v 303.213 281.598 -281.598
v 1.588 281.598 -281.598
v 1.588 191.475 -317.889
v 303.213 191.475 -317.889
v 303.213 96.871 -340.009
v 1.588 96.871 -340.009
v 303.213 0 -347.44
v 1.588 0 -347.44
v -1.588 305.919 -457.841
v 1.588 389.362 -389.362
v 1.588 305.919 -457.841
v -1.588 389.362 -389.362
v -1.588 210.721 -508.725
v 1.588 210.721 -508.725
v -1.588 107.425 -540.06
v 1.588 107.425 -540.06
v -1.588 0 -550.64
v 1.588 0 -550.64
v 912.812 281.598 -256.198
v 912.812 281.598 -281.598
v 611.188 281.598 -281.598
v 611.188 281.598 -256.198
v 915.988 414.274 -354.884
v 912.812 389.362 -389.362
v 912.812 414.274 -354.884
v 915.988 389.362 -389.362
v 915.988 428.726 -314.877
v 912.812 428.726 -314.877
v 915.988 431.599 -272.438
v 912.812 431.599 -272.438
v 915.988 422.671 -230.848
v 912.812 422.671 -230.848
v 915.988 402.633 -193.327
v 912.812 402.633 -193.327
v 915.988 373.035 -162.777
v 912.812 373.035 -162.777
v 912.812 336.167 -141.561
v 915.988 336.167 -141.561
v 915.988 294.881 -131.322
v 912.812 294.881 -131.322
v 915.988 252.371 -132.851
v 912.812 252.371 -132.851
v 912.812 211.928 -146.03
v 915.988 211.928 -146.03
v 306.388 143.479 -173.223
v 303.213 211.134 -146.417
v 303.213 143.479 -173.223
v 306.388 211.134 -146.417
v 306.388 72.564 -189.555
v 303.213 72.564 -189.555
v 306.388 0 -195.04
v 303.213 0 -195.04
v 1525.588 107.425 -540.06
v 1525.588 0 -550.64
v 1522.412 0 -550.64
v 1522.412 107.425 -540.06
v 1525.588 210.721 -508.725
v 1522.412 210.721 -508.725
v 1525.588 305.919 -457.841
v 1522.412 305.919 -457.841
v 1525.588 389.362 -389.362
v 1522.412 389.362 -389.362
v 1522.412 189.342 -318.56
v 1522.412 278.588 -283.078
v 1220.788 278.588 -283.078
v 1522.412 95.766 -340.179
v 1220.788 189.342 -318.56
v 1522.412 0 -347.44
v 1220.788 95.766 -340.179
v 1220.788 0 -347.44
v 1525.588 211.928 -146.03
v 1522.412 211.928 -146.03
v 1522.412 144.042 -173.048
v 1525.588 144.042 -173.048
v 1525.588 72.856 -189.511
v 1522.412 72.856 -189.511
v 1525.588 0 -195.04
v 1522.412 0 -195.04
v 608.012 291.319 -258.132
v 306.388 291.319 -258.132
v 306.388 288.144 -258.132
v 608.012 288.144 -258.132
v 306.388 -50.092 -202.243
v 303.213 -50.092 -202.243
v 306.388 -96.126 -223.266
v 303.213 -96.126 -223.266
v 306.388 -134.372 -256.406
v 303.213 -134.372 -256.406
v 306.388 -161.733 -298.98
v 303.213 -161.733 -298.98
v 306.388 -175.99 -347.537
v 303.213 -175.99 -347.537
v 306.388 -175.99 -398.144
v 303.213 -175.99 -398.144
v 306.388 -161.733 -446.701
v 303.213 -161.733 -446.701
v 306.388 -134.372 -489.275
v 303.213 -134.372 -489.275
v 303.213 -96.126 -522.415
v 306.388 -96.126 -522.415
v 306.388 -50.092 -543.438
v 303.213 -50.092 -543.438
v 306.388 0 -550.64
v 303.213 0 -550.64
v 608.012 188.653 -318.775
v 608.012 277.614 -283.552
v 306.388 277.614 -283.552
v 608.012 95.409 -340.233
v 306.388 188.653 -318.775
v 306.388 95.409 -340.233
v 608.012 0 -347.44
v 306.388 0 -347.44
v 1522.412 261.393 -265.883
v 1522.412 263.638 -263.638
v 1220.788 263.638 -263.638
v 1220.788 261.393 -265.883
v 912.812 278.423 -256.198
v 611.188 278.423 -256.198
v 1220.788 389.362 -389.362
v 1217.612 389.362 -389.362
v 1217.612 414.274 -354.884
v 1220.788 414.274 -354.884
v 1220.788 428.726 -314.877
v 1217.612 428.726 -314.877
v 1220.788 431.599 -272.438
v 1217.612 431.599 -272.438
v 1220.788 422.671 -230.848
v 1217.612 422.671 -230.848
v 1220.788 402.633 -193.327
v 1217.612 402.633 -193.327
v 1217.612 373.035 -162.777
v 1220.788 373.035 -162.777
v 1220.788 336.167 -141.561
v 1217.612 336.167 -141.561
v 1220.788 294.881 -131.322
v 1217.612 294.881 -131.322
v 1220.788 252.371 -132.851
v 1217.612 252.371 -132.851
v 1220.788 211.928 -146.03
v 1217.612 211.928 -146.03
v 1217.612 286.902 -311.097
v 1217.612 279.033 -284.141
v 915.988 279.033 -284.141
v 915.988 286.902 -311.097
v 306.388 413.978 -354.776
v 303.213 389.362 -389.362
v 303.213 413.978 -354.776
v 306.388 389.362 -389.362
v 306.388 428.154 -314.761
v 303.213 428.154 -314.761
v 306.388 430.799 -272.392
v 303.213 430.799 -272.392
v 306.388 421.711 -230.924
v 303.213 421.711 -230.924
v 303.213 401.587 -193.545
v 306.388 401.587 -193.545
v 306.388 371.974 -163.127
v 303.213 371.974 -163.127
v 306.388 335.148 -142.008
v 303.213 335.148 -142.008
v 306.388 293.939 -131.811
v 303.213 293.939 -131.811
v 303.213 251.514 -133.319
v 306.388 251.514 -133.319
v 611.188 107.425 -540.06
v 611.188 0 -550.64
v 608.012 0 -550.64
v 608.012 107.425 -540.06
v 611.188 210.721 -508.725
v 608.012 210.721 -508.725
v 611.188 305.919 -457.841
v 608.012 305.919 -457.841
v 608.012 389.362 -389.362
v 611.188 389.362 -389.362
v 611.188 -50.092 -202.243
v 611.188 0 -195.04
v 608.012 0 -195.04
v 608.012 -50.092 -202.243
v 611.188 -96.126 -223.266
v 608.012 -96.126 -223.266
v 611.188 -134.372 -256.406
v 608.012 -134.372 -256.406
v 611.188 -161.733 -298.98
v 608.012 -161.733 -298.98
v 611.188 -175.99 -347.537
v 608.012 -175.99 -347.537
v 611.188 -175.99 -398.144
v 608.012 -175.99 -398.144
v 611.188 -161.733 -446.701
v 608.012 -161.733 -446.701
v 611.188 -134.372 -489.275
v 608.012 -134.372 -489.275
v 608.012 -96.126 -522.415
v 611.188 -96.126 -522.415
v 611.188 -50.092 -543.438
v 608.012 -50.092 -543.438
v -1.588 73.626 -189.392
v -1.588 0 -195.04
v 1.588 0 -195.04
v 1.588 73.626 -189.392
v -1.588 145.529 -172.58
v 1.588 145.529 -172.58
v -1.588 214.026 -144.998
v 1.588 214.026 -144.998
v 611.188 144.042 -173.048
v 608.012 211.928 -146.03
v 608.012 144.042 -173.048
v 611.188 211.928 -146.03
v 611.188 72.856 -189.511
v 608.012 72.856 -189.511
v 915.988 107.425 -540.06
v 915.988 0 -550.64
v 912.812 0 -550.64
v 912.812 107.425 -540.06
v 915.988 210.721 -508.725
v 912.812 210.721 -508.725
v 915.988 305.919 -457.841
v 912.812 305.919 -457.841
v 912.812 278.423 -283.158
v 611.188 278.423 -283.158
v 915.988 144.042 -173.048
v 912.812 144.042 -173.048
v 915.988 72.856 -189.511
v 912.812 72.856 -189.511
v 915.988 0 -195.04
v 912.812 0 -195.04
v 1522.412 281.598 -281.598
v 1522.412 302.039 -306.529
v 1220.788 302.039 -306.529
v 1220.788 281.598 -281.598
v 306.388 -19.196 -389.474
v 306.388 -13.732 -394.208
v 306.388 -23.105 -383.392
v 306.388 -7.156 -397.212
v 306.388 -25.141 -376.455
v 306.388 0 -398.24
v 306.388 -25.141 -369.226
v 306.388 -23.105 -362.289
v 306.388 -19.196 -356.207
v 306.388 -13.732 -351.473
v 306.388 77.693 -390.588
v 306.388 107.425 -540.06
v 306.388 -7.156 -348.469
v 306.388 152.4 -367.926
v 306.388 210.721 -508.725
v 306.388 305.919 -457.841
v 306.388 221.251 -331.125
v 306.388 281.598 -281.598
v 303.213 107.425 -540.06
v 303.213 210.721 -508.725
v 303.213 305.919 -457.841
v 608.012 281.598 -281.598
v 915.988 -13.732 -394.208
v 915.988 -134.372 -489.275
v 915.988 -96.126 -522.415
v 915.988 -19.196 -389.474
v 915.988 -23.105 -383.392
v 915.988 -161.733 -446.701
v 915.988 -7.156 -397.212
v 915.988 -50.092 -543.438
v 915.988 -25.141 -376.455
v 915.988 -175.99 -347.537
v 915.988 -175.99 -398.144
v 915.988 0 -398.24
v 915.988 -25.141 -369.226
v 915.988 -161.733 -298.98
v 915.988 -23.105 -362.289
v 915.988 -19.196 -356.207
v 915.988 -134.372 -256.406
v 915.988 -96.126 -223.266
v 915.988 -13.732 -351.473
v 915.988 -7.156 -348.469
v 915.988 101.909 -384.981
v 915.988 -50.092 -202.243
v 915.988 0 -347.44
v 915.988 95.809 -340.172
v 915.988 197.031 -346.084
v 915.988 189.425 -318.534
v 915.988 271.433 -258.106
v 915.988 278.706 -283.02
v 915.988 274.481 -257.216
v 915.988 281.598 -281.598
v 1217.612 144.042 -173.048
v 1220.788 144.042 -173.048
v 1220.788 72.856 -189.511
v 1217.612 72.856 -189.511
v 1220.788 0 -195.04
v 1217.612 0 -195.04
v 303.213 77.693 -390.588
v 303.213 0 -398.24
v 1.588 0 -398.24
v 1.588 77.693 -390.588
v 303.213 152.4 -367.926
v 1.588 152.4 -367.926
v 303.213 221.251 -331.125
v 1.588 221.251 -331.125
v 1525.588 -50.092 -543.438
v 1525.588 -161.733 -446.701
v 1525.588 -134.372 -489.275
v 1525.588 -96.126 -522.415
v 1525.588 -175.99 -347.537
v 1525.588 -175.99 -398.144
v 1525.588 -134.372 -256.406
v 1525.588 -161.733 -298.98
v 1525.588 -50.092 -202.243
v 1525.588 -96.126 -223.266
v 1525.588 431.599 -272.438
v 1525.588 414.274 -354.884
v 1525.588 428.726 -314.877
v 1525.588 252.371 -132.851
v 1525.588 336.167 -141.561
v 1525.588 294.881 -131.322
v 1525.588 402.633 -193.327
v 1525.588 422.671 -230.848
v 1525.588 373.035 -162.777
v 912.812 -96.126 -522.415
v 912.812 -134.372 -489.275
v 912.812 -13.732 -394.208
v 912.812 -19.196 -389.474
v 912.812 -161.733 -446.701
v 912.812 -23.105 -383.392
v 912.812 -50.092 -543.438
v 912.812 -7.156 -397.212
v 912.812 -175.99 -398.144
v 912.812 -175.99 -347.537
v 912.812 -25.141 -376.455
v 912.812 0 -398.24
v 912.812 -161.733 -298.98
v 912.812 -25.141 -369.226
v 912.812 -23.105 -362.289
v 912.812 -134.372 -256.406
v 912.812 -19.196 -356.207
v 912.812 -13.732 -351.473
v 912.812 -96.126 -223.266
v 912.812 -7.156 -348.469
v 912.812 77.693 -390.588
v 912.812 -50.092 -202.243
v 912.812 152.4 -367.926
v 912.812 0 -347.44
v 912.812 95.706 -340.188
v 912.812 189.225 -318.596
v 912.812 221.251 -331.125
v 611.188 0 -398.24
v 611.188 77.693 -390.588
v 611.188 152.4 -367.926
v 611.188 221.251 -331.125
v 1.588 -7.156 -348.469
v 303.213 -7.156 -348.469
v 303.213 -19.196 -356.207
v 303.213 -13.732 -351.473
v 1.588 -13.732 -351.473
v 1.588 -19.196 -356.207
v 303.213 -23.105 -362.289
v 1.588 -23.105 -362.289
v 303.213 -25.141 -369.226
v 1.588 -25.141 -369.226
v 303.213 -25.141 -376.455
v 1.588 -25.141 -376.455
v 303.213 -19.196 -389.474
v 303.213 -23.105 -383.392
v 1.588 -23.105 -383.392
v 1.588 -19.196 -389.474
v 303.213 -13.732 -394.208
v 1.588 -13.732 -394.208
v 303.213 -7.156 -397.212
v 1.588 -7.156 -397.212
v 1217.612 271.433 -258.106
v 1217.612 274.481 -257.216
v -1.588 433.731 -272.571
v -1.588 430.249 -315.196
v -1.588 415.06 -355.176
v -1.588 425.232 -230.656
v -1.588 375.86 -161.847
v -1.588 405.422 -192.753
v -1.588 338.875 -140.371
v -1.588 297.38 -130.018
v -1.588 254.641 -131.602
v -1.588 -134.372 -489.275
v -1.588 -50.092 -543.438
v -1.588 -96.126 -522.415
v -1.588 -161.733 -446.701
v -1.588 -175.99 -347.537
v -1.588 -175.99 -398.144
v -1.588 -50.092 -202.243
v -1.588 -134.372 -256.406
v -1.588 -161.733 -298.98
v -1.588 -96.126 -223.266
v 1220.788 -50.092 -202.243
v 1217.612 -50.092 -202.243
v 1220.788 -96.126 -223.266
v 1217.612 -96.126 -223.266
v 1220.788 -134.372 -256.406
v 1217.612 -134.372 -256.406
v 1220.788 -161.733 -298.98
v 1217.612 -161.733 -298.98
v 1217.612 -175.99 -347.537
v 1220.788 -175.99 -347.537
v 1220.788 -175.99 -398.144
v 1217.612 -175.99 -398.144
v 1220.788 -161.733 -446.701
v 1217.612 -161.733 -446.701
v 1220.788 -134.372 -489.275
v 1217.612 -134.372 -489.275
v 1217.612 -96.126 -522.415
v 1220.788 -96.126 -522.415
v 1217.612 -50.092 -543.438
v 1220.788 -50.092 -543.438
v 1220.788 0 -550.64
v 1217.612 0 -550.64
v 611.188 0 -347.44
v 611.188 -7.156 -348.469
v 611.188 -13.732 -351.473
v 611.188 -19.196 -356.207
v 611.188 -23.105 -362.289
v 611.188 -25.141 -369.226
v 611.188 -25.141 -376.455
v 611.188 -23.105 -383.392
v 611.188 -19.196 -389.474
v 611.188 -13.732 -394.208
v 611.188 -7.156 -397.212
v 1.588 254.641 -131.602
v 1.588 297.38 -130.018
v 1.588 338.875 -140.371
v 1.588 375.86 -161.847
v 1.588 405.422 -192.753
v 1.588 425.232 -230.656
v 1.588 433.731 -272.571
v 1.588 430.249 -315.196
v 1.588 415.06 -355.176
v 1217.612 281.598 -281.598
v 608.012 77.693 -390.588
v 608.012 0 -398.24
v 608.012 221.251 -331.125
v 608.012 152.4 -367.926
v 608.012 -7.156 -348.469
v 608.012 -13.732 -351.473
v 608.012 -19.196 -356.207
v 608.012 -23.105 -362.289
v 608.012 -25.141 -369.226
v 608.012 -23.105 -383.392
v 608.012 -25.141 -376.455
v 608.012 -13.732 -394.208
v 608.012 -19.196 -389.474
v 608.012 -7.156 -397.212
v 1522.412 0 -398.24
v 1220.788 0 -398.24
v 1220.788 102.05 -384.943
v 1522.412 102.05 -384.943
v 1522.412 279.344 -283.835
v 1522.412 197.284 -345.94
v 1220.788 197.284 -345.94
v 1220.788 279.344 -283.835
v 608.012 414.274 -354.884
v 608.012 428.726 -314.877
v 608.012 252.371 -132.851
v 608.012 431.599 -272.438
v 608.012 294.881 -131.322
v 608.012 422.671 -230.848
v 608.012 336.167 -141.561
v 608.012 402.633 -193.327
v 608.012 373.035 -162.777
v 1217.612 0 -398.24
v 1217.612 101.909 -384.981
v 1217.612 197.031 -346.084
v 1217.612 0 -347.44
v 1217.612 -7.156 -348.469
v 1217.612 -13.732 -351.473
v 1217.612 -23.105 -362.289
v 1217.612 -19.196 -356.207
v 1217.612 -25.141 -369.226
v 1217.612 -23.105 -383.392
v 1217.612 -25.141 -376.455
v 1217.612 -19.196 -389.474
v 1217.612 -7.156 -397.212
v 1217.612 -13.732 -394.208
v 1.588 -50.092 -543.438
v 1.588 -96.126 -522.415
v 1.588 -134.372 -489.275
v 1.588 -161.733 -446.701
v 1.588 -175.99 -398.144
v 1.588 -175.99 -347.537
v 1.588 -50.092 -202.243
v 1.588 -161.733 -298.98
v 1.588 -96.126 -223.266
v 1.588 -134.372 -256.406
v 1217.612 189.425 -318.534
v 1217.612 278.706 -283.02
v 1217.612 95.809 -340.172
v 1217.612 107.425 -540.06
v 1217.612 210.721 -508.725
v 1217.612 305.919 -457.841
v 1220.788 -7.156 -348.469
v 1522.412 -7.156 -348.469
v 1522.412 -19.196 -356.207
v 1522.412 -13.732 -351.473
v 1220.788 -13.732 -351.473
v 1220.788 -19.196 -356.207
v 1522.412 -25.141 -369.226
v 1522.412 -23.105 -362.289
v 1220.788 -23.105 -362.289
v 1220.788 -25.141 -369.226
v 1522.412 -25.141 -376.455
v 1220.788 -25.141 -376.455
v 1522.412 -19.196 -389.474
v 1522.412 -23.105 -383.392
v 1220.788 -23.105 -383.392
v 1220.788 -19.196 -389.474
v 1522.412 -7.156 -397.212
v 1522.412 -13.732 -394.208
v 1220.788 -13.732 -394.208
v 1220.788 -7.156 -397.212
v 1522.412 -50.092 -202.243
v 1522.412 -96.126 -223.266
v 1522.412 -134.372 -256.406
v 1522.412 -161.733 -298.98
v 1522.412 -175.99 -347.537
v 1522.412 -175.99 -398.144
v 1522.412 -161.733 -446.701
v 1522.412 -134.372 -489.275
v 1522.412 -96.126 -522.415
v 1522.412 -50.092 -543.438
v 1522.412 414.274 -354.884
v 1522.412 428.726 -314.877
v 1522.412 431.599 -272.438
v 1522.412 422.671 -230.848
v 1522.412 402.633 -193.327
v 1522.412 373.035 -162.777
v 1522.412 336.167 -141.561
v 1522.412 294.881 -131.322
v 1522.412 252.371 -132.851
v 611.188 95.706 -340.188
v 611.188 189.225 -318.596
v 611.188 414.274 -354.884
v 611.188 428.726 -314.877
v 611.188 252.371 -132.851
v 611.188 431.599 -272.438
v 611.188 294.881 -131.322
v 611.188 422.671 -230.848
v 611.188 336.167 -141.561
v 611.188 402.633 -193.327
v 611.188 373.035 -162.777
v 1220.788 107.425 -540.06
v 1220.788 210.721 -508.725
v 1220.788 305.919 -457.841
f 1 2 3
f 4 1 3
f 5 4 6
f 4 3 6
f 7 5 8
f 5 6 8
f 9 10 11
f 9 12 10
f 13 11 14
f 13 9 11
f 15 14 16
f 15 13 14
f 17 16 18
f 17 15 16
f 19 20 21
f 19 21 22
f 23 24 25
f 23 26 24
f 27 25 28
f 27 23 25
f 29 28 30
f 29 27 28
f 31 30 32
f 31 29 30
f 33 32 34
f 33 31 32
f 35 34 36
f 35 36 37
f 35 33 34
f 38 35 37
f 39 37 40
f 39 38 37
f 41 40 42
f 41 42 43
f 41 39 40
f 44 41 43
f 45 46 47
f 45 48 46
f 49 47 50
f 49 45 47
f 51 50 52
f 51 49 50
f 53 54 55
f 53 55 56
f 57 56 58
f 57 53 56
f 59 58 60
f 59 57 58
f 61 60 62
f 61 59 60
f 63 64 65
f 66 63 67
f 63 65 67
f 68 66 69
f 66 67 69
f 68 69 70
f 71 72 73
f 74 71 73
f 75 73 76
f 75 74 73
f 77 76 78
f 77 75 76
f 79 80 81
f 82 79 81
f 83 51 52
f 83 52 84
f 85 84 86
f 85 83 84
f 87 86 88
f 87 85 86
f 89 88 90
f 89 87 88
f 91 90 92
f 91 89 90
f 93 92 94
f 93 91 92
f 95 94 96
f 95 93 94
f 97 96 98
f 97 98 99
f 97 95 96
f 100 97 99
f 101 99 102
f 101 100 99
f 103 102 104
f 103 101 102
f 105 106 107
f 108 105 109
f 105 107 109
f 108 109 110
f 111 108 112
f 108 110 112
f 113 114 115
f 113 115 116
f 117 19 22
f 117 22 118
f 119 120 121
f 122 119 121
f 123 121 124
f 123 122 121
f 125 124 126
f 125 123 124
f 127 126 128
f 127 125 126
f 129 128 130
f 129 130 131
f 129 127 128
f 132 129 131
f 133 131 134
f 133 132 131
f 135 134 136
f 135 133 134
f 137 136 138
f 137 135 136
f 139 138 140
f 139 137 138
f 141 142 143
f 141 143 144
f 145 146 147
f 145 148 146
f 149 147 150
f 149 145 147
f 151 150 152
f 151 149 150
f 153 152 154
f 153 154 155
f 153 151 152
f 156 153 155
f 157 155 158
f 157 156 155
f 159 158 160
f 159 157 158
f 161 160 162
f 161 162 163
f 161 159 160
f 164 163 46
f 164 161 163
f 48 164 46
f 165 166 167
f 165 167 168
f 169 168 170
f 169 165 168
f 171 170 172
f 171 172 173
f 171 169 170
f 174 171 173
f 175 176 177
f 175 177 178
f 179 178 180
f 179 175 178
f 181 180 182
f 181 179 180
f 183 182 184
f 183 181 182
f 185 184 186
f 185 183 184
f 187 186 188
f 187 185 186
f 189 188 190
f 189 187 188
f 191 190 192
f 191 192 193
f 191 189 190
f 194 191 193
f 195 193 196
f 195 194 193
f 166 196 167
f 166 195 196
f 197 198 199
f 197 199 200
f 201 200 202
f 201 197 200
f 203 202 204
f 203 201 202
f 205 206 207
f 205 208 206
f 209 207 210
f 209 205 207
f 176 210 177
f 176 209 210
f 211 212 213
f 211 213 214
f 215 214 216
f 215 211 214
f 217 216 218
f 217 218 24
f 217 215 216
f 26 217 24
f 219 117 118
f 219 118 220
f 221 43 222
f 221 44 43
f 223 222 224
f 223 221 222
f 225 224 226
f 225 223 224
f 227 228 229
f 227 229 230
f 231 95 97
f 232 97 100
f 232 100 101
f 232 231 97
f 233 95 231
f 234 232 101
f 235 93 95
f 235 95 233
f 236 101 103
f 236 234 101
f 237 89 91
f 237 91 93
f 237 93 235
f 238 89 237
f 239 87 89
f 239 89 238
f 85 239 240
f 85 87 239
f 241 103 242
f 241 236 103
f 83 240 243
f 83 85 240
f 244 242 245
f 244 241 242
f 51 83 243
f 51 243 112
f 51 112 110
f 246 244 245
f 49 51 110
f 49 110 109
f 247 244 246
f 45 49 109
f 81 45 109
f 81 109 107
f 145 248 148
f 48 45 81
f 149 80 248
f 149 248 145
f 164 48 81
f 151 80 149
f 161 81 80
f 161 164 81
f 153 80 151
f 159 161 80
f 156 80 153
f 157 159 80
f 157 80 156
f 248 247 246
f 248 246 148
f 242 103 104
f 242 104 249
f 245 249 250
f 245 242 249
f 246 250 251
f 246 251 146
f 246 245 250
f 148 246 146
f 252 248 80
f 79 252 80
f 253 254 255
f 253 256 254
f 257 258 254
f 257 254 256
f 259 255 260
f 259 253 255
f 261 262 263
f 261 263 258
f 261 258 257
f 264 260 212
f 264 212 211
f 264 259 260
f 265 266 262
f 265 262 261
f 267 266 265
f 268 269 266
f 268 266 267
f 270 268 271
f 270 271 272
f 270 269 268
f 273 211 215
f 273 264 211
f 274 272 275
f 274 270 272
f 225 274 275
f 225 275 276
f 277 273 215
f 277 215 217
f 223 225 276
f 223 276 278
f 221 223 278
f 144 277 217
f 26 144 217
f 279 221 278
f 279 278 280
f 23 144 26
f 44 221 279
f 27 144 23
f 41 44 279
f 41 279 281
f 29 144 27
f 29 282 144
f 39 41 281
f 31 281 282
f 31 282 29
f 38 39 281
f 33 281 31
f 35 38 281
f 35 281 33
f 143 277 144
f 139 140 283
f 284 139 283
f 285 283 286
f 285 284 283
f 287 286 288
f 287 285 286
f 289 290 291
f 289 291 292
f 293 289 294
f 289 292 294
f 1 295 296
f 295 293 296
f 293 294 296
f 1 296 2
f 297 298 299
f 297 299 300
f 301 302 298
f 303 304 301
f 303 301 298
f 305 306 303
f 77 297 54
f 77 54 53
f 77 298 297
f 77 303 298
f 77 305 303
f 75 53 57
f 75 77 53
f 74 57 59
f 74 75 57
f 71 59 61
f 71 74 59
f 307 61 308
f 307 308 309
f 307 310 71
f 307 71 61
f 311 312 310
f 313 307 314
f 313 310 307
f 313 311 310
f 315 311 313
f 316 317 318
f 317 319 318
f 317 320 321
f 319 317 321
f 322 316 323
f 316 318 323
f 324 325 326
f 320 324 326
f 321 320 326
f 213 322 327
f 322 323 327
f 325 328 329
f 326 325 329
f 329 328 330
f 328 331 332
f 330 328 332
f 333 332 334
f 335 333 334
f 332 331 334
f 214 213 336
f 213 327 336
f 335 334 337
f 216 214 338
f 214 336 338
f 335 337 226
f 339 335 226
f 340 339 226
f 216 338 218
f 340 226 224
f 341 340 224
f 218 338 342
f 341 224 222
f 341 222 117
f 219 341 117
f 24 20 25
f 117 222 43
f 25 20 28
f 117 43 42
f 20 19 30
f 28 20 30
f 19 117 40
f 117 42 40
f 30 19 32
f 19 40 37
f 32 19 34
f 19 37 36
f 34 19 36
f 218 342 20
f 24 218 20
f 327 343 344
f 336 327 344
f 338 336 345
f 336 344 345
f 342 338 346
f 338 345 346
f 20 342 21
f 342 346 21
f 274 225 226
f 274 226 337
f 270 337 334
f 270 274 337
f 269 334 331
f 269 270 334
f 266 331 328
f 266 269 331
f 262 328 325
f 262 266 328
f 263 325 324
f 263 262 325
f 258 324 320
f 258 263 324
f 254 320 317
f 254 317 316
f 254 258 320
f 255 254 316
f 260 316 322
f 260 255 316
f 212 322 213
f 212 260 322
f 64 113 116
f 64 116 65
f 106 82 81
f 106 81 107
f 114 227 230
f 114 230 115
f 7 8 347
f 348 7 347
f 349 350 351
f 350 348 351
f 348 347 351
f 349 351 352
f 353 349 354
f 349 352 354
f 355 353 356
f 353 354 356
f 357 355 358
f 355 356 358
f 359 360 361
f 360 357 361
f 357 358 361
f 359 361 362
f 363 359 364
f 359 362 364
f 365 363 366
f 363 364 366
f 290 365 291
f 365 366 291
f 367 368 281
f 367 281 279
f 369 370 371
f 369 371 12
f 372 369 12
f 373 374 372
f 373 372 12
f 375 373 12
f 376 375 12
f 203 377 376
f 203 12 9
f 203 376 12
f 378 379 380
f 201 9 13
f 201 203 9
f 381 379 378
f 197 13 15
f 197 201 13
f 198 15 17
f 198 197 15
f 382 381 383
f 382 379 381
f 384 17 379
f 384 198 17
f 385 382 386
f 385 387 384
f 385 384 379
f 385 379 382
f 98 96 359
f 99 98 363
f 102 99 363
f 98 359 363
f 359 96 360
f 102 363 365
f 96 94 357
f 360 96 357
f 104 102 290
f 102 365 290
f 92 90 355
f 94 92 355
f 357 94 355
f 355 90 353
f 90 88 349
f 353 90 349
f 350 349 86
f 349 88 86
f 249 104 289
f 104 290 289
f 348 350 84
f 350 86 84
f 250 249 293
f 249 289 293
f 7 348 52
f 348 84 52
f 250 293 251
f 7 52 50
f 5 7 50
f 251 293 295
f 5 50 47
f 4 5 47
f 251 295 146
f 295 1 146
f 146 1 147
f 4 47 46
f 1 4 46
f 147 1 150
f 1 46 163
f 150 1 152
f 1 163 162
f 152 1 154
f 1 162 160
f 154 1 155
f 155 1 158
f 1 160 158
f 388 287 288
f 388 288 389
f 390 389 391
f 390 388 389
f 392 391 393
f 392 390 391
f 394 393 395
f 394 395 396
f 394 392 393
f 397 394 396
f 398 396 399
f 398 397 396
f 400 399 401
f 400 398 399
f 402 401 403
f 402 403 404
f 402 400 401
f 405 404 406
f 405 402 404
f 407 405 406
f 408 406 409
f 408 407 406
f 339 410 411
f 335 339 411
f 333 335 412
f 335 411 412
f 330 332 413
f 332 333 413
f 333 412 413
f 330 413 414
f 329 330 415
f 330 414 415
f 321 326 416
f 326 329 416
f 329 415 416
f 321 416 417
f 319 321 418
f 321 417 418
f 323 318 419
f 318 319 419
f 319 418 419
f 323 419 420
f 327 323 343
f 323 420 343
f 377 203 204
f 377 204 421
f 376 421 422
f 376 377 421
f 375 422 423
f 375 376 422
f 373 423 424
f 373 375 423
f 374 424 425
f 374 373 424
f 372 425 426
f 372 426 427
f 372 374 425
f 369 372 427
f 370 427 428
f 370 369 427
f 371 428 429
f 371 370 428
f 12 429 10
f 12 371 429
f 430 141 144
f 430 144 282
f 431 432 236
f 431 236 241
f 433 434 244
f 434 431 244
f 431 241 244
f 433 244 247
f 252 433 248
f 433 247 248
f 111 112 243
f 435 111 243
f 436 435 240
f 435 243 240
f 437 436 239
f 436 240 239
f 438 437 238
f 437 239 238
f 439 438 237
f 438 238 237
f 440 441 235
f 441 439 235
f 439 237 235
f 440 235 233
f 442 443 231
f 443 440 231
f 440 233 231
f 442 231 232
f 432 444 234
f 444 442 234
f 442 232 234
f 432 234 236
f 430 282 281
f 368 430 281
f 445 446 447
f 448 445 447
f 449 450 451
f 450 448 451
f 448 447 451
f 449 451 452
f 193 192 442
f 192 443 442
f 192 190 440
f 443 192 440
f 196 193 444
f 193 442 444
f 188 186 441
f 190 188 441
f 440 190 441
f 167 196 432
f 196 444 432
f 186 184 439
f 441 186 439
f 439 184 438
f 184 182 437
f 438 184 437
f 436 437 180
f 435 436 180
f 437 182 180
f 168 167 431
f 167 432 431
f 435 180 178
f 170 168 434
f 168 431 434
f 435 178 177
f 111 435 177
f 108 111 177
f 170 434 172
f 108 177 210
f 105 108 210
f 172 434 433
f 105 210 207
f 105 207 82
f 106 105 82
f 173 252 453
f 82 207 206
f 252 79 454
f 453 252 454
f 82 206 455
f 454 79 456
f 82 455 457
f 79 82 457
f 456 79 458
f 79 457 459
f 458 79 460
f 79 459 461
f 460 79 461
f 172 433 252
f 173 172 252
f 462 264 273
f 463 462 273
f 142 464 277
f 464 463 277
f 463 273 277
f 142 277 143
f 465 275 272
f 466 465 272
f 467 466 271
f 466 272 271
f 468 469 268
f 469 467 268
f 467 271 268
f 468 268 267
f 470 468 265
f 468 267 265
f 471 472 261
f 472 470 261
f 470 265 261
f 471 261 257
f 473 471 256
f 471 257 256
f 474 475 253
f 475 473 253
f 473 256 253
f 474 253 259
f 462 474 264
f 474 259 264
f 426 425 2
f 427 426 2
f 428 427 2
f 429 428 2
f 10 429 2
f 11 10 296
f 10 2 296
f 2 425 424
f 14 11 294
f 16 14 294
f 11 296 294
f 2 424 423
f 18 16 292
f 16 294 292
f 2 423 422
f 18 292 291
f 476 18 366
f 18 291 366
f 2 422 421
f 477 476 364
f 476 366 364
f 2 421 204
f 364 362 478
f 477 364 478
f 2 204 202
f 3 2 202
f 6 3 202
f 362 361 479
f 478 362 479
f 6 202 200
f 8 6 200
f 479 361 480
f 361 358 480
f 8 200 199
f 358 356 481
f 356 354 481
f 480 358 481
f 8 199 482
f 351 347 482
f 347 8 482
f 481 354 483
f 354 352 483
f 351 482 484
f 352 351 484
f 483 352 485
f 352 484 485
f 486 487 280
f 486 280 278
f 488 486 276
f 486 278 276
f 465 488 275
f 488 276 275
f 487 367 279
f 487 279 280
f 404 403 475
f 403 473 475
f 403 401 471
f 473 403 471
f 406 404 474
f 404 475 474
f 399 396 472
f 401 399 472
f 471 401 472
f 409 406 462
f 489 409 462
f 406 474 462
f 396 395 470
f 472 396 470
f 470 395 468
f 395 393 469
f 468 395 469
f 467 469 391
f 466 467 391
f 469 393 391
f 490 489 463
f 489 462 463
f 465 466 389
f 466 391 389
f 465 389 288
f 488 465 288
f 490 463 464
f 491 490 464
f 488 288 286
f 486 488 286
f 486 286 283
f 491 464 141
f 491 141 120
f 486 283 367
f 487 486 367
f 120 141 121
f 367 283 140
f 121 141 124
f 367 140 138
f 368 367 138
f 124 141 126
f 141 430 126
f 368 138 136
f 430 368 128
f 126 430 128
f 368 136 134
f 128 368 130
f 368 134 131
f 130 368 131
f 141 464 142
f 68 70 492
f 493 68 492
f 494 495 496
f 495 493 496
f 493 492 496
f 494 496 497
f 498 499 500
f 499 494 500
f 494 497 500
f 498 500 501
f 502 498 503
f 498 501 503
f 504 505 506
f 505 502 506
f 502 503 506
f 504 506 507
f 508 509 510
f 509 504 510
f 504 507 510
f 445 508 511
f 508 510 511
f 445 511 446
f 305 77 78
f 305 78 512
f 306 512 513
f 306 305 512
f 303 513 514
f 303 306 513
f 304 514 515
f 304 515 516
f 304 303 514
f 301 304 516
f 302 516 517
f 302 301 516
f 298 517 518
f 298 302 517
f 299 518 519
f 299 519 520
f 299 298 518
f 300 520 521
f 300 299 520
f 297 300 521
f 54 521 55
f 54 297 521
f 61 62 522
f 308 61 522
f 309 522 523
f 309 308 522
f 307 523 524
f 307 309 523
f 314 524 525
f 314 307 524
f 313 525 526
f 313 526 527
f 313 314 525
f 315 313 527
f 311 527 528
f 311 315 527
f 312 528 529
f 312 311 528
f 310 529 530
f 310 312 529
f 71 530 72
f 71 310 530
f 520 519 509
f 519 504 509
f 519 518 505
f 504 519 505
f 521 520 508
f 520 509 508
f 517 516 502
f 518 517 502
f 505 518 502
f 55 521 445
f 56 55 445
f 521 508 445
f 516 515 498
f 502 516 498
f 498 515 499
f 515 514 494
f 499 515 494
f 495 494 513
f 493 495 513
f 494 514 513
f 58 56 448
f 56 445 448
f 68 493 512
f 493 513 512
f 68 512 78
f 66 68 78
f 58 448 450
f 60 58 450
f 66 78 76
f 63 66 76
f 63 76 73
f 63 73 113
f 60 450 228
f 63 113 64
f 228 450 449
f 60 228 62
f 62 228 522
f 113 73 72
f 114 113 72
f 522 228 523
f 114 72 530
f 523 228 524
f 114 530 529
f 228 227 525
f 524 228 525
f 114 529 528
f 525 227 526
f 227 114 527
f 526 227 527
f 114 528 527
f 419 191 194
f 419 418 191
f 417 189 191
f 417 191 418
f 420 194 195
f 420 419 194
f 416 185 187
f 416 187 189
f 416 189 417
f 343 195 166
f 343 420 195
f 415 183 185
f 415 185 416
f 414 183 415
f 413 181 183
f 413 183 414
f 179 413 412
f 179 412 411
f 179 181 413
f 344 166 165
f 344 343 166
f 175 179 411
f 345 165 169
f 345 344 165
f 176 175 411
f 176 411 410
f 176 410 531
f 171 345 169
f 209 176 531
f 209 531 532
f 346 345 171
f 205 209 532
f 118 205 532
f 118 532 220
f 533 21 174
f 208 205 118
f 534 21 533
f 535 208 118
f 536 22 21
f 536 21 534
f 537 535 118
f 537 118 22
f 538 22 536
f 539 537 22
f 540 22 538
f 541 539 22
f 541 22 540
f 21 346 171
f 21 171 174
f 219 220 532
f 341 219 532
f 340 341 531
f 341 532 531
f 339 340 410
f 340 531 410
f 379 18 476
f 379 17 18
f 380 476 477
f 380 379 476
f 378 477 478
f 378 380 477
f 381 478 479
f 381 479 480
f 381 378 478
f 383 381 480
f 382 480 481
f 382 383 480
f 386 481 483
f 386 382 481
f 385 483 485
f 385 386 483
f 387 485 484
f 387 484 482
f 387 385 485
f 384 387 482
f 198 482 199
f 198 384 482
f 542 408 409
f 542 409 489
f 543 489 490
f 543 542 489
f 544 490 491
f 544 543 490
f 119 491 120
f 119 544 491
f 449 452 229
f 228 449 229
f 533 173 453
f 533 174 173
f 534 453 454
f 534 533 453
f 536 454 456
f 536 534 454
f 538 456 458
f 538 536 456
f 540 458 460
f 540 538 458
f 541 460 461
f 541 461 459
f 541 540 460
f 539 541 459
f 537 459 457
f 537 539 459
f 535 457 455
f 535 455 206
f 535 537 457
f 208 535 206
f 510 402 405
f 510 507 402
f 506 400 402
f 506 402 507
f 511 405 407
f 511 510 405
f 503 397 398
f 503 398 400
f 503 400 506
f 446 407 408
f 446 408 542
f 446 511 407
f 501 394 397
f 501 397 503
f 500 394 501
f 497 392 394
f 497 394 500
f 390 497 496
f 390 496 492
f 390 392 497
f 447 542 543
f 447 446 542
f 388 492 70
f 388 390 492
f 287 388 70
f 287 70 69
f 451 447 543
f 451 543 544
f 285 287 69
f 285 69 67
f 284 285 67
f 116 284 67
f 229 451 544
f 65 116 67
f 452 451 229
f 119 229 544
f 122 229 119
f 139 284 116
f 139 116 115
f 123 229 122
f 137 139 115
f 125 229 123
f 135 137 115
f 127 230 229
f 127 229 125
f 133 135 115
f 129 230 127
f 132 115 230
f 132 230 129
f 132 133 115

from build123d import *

# Parameters (mm, degrees)
F1_DEPTH  = 1524
F4_DEPTH  = 304.8
F7_DEPTH  = 304.8
F10_DEPTH = 304.8
F14_DEPTH = 1.5875
F16_DEPTH = 1.5875
F18_DEPTH = 1.5875
F20_DEPTH = 1.5875
F22_DEPTH = 1.5875
F24_DEPTH = 304.8
F26_DEPTH = 1.5875


with BuildPart() as f1:
    # F0 (on Right) → F1 (new body)
    with BuildSketch(Plane.YZ):
        with BuildLine():
            ThreePointArc((0, -347.4403916943), (-25.4, -372.8403916943), (0, -398.2403916943))
            ThreePointArc((0, -398.2403916943), (152.4, -367.9261469057), (281.5984815094, -281.5984815094))
            ThreePointArc((281.5984815094, -281.5984815094), (144.5967339925, -330.7608902035), (0, -347.4403916943))
        make_face()
    extrude(amount=F1_DEPTH)

    # F3 (on 3pt) → F4 (join)
    with BuildSketch(Plane.YZ.offset(1524)):
        Polygon((302.0386043773, -306.5287324379), (281.5984815094, -281.5984815094), (263.6379692673, -263.6379692673), (261.392905237, -265.8830332976), align=None)
    extrude(amount=-F4_DEPTH)

    # F6 (on offset) → F7 (join)
    with BuildSketch(Plane.YZ.offset(1219.2)):
        Polygon((286.9017213141, -311.0970612814), (281.5984815094, -281.5984815094), (274.4811571478, -257.216035079), (271.433351344, -258.1057006243), align=None)
    extrude(amount=-F7_DEPTH)

    # F9 (on offset) → F10 (join)
    with BuildSketch(Plane.YZ.offset(914.4)):
        Polygon((278.4234815094, -284.1384815094), (281.5984815094, -281.5984815094), (281.5984815094, -256.1984815094), (278.4234815094, -256.1984815094), align=None)
    extrude(amount=-F10_DEPTH)

    # F13 (on face) → F14 (join, symmetric)
    with BuildSketch(Plane(origin=(0, 0, 0), x_dir=(0, -1, 0), z_dir=(-1, 0, 0))):
        with BuildLine():
            ThreePointArc((0, -550.6403916943), (177.8, -372.8403916943), (0, -195.0403916943))
            ThreePointArc((0, -195.0403916943), (-109.8991760494, -182.3633178757), (-214.0258651779, -144.9979634939))
            ThreePointArc((-214.0258651779, -144.9979634939), (-405.4217806891, -192.7528255646), (-389.3615549623, -389.3615549623))
            ThreePointArc((-389.3615549623, -389.3615549623), (-210.7209550924, -508.7253876604), (0, -550.6403916943))
        make_face()
    extrude(amount=F14_DEPTH, both=True)

    # F15 (on offset) → F16 (join, symmetric)
    with BuildSketch(Plane.YZ.offset(609.6)):
        with BuildLine():
            ThreePointArc((211.9278055472, -146.0295007467), (108.760588215, -182.6280830102), (0, -195.0403916943))
            ThreePointArc((0, -195.0403916943), (-177.8, -372.8403916943), (0, -550.6403916943))
            ThreePointArc((0, -550.6403916943), (210.7209550924, -508.7253876604), (389.3615549623, -389.3615549623))
            ThreePointArc((389.3615549623, -389.3615549623), (402.6332177904, -193.3271563276), (211.9278055472, -146.0295007467))
        make_face()
    extrude(amount=F16_DEPTH, both=True)

    # F17 (on offset) → F18 (join, symmetric)
    with BuildSketch(Plane.YZ.offset(914.4)):
        with BuildLine():
            ThreePointArc((211.9278055472, -146.0295007467), (108.760588215, -182.6280830102), (0, -195.0403916943))
            ThreePointArc((0, -195.0403916943), (-177.8, -372.8403916943), (0, -550.6403916943))
            ThreePointArc((0, -550.6403916943), (210.7209550924, -508.7253876604), (389.3615549623, -389.3615549623))
            ThreePointArc((389.3615549623, -389.3615549623), (402.6332177904, -193.3271563276), (211.9278055472, -146.0295007467))
        make_face()
    extrude(amount=F18_DEPTH, both=True)

    # F19 (on offset) → F20 (join, symmetric)
    with BuildSketch(Plane.YZ.offset(1219.2)):
        with BuildLine():
            ThreePointArc((211.9278055472, -146.0295007467), (108.760588215, -182.6280830102), (0, -195.0403916943))
            ThreePointArc((0, -195.0403916943), (-177.8, -372.8403916943), (0, -550.6403916943))
            ThreePointArc((0, -550.6403916943), (210.7209550924, -508.7253876604), (389.3615549623, -389.3615549623))
            ThreePointArc((389.3615549623, -389.3615549623), (402.6332177904, -193.3271563276), (211.9278055472, -146.0295007467))
        make_face()
    extrude(amount=F20_DEPTH, both=True)

    # F21 (on 3pt) → F22 (join, symmetric)
    with BuildSketch(Plane.YZ.offset(1524)):
        with BuildLine():
            ThreePointArc((211.9278055472, -146.0295007467), (108.760588215, -182.6280830102), (0, -195.0403916943))
            ThreePointArc((0, -195.0403916943), (-177.8, -372.8403916943), (0, -550.6403916943))
            ThreePointArc((0, -550.6403916943), (210.7209550924, -508.7253876604), (389.3615549623, -389.3615549623))
            ThreePointArc((389.3615549623, -389.3615549623), (402.6332177904, -193.3271563276), (211.9278055472, -146.0295007467))
        make_face()
    extrude(amount=F22_DEPTH, both=True)

    # F23 (on offset) → F24 (join)
    with BuildSketch(Plane.YZ.offset(609.6)):
        Polygon((277.4514655912, -283.945135522), (281.5984815094, -281.5984815094), (291.3186406915, -258.1319413837), (288.1436406915, -258.1319413837), align=None)
    extrude(amount=-F24_DEPTH)

    # F25 (on offset) → F26 (join, symmetric)
    with BuildSketch(Plane.YZ.offset(304.8)):
        with BuildLine():
            ThreePointArc((211.1335691615, -146.4167113639), (108.3301046752, -182.7274300654), (0, -195.0403916943))
            ThreePointArc((0, -195.0403916943), (-177.8, -372.8403916943), (0, -550.6403916943))
            ThreePointArc((0, -550.6403916943), (210.7209550924, -508.7253876604), (389.3615549623, -389.3615549623))
            ThreePointArc((389.3615549623, -389.3615549623), (401.5869061697, -193.5450684149), (211.1335691615, -146.4167113639))
        make_face()
    extrude(amount=F26_DEPTH, both=True)


solid = f1.part
